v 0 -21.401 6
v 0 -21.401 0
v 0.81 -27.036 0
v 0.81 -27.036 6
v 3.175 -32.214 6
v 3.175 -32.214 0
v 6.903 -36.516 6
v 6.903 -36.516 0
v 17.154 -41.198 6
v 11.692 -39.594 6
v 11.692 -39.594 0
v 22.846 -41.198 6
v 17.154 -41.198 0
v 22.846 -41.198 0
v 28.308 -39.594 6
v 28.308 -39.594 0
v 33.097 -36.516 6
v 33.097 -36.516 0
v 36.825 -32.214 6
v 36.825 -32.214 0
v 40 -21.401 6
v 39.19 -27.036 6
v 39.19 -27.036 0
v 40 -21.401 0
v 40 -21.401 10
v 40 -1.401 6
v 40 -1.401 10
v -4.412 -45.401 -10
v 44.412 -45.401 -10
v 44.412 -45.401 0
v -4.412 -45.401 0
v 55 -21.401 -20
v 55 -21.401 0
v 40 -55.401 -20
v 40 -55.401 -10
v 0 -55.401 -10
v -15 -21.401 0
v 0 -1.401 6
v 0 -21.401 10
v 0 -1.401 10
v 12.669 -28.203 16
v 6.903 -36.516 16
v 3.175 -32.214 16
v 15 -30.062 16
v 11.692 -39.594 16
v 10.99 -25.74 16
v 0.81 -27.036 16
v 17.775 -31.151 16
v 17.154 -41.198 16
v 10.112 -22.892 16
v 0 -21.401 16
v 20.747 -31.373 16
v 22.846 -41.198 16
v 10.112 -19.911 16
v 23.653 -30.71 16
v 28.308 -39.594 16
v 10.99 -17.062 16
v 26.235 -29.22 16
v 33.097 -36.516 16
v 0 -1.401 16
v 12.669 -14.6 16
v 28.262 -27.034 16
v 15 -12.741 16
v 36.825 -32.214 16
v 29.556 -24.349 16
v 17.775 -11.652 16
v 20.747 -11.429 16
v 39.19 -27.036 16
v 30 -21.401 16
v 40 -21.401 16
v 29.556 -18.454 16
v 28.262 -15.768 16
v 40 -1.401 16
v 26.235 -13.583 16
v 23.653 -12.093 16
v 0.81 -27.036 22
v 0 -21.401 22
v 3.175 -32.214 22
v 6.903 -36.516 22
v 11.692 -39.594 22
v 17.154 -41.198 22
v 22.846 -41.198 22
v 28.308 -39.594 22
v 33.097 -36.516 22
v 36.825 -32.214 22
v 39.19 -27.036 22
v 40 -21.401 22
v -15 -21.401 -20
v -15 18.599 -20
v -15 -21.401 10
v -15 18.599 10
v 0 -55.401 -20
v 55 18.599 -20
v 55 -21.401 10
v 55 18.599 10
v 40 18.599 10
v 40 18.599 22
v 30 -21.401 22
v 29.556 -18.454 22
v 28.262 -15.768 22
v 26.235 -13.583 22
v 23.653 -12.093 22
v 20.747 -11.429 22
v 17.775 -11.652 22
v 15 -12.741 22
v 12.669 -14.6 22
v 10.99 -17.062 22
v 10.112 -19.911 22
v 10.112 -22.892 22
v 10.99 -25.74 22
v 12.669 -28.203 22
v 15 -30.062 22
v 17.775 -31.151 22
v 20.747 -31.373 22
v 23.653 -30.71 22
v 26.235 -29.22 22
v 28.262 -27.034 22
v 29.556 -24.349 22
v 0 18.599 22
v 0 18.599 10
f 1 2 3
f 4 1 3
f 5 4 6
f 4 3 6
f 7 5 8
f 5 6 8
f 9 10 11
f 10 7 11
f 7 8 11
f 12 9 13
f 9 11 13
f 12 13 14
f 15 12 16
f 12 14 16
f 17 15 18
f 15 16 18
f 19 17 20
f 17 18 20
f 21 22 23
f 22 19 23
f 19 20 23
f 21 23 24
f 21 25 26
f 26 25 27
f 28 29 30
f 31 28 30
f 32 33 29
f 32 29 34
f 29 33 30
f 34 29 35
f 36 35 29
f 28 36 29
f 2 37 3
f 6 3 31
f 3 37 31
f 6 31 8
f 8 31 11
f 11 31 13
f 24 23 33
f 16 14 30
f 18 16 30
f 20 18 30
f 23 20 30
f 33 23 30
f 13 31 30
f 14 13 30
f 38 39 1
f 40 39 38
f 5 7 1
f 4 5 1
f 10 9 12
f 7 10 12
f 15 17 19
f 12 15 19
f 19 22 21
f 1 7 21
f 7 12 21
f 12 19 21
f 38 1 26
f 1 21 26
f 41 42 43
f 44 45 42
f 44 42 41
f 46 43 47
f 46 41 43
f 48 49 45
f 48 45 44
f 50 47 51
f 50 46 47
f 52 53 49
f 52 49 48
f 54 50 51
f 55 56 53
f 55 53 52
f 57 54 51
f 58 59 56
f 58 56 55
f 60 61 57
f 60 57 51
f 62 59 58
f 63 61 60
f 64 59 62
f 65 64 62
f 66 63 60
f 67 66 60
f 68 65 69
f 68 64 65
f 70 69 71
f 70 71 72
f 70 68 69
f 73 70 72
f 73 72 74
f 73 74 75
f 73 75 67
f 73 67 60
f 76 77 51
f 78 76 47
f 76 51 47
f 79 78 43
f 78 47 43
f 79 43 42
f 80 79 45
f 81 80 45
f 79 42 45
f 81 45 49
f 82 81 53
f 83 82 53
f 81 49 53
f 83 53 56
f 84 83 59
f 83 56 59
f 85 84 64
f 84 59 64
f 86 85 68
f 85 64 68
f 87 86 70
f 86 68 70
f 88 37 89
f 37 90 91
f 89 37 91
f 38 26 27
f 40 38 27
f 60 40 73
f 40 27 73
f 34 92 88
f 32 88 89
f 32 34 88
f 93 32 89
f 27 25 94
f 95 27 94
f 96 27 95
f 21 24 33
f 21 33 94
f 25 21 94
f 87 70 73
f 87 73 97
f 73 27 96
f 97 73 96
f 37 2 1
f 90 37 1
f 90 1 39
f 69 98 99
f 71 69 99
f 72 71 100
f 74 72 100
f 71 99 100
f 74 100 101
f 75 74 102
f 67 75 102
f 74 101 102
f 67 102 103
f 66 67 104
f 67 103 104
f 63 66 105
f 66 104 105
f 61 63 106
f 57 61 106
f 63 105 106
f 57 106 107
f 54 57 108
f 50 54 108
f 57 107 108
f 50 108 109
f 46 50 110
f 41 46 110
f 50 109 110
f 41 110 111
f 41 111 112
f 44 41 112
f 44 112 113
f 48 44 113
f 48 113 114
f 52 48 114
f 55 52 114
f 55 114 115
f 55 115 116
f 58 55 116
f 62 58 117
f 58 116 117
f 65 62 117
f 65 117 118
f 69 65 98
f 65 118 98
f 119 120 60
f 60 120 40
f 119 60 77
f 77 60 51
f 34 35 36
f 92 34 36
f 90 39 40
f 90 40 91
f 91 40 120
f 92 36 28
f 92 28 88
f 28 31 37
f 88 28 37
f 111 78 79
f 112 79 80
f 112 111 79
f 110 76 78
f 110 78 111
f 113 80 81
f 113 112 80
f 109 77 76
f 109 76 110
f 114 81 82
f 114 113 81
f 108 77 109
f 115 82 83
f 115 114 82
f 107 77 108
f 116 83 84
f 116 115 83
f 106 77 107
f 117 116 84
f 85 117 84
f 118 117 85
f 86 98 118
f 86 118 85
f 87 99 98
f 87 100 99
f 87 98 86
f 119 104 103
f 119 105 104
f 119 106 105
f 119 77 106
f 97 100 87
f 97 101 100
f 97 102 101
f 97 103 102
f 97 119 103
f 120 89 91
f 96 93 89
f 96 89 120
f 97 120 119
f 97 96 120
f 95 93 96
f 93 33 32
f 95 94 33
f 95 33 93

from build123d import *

# Parameters (mm, degrees)
F1_DEPTH       = 22
F3_R           = 10
F4_DEPTH       = 6
F6_DEPTH       = 20
F7_W           = 10
F7_H           = 10
F8_DEPTH       = 55.001
F8_DEPTH_BACK  = 15.001
F9_W           = 40
F9_H           = 30
F10_DEPTH      = 15
F10_DEPTH_BACK = 55
F2_W           = 40
F2_H           = 10
F11_DEPTH      = 40


# Not quite as in the source:
# - an extrude ends at something that could not be found from the text; its depth is read off the source's solid


with BuildPart() as f1:
    # F0 (on Top) → F1 (new body)
    with BuildSketch(Plane.XY):
        with BuildLine():
            Line((40, 18.5987265639), (0, 18.5987265639))
            Line((0, 18.5987265639), (0, -21.4012734361))
            ThreePointArc((0, -21.4012734361), (20, -41.4012734361), (40, -21.4012734361))
            Line((40, -21.4012734361), (40, 18.5987265639))
        make_face()
    extrude(amount=F1_DEPTH)

    # F3 (on face) → F4 (cut)
    with BuildSketch(Plane.XY.offset(22)):
        with Locations((20, -21.4012734361)):
            Circle(F3_R)
    extrude(amount=-F4_DEPTH, mode=Mode.SUBTRACT)

    # F5 (on face) → F6 (join)
    with BuildSketch(Plane(origin=(0, 0, 0), x_dir=(1, 0, 0), z_dir=(0, 0, -1))):
        Polygon((0, 55.4012734361), (-15, 21.4012734361), (55, 21.4012734361), (40, 55.4012734361), align=None)
    extrude(amount=F6_DEPTH)

    # F7 (on face) → F8 (cut, two sides)
    with BuildSketch(Plane.YZ.offset(40)) as f8_sk:
        with Locations((-50.4012734361, -5)):
            Rectangle(F7_W, F7_H)
    extrude(amount=-F8_DEPTH, mode=Mode.SUBTRACT)
    extrude(f8_sk.sketch, amount=F8_DEPTH_BACK, mode=Mode.SUBTRACT)

    # F9 (on face) → F10 (join, two sides)
    with BuildSketch(Plane.YZ.offset(40)) as f10_sk:
        with Locations((-1.4012734361, -5)):
            Rectangle(F9_W, F9_H)
    extrude(amount=F10_DEPTH)
    extrude(f10_sk.sketch, amount=-F10_DEPTH_BACK)

    # F2 (on face) → F11 (cut, through all)
    with BuildSketch(Plane.YZ.offset(40)):
        with Locations((-21.4012734361, 11)):
            Rectangle(F2_W, F2_H)
    extrude(amount=-F11_DEPTH, mode=Mode.SUBTRACT)


solid = f1.part
